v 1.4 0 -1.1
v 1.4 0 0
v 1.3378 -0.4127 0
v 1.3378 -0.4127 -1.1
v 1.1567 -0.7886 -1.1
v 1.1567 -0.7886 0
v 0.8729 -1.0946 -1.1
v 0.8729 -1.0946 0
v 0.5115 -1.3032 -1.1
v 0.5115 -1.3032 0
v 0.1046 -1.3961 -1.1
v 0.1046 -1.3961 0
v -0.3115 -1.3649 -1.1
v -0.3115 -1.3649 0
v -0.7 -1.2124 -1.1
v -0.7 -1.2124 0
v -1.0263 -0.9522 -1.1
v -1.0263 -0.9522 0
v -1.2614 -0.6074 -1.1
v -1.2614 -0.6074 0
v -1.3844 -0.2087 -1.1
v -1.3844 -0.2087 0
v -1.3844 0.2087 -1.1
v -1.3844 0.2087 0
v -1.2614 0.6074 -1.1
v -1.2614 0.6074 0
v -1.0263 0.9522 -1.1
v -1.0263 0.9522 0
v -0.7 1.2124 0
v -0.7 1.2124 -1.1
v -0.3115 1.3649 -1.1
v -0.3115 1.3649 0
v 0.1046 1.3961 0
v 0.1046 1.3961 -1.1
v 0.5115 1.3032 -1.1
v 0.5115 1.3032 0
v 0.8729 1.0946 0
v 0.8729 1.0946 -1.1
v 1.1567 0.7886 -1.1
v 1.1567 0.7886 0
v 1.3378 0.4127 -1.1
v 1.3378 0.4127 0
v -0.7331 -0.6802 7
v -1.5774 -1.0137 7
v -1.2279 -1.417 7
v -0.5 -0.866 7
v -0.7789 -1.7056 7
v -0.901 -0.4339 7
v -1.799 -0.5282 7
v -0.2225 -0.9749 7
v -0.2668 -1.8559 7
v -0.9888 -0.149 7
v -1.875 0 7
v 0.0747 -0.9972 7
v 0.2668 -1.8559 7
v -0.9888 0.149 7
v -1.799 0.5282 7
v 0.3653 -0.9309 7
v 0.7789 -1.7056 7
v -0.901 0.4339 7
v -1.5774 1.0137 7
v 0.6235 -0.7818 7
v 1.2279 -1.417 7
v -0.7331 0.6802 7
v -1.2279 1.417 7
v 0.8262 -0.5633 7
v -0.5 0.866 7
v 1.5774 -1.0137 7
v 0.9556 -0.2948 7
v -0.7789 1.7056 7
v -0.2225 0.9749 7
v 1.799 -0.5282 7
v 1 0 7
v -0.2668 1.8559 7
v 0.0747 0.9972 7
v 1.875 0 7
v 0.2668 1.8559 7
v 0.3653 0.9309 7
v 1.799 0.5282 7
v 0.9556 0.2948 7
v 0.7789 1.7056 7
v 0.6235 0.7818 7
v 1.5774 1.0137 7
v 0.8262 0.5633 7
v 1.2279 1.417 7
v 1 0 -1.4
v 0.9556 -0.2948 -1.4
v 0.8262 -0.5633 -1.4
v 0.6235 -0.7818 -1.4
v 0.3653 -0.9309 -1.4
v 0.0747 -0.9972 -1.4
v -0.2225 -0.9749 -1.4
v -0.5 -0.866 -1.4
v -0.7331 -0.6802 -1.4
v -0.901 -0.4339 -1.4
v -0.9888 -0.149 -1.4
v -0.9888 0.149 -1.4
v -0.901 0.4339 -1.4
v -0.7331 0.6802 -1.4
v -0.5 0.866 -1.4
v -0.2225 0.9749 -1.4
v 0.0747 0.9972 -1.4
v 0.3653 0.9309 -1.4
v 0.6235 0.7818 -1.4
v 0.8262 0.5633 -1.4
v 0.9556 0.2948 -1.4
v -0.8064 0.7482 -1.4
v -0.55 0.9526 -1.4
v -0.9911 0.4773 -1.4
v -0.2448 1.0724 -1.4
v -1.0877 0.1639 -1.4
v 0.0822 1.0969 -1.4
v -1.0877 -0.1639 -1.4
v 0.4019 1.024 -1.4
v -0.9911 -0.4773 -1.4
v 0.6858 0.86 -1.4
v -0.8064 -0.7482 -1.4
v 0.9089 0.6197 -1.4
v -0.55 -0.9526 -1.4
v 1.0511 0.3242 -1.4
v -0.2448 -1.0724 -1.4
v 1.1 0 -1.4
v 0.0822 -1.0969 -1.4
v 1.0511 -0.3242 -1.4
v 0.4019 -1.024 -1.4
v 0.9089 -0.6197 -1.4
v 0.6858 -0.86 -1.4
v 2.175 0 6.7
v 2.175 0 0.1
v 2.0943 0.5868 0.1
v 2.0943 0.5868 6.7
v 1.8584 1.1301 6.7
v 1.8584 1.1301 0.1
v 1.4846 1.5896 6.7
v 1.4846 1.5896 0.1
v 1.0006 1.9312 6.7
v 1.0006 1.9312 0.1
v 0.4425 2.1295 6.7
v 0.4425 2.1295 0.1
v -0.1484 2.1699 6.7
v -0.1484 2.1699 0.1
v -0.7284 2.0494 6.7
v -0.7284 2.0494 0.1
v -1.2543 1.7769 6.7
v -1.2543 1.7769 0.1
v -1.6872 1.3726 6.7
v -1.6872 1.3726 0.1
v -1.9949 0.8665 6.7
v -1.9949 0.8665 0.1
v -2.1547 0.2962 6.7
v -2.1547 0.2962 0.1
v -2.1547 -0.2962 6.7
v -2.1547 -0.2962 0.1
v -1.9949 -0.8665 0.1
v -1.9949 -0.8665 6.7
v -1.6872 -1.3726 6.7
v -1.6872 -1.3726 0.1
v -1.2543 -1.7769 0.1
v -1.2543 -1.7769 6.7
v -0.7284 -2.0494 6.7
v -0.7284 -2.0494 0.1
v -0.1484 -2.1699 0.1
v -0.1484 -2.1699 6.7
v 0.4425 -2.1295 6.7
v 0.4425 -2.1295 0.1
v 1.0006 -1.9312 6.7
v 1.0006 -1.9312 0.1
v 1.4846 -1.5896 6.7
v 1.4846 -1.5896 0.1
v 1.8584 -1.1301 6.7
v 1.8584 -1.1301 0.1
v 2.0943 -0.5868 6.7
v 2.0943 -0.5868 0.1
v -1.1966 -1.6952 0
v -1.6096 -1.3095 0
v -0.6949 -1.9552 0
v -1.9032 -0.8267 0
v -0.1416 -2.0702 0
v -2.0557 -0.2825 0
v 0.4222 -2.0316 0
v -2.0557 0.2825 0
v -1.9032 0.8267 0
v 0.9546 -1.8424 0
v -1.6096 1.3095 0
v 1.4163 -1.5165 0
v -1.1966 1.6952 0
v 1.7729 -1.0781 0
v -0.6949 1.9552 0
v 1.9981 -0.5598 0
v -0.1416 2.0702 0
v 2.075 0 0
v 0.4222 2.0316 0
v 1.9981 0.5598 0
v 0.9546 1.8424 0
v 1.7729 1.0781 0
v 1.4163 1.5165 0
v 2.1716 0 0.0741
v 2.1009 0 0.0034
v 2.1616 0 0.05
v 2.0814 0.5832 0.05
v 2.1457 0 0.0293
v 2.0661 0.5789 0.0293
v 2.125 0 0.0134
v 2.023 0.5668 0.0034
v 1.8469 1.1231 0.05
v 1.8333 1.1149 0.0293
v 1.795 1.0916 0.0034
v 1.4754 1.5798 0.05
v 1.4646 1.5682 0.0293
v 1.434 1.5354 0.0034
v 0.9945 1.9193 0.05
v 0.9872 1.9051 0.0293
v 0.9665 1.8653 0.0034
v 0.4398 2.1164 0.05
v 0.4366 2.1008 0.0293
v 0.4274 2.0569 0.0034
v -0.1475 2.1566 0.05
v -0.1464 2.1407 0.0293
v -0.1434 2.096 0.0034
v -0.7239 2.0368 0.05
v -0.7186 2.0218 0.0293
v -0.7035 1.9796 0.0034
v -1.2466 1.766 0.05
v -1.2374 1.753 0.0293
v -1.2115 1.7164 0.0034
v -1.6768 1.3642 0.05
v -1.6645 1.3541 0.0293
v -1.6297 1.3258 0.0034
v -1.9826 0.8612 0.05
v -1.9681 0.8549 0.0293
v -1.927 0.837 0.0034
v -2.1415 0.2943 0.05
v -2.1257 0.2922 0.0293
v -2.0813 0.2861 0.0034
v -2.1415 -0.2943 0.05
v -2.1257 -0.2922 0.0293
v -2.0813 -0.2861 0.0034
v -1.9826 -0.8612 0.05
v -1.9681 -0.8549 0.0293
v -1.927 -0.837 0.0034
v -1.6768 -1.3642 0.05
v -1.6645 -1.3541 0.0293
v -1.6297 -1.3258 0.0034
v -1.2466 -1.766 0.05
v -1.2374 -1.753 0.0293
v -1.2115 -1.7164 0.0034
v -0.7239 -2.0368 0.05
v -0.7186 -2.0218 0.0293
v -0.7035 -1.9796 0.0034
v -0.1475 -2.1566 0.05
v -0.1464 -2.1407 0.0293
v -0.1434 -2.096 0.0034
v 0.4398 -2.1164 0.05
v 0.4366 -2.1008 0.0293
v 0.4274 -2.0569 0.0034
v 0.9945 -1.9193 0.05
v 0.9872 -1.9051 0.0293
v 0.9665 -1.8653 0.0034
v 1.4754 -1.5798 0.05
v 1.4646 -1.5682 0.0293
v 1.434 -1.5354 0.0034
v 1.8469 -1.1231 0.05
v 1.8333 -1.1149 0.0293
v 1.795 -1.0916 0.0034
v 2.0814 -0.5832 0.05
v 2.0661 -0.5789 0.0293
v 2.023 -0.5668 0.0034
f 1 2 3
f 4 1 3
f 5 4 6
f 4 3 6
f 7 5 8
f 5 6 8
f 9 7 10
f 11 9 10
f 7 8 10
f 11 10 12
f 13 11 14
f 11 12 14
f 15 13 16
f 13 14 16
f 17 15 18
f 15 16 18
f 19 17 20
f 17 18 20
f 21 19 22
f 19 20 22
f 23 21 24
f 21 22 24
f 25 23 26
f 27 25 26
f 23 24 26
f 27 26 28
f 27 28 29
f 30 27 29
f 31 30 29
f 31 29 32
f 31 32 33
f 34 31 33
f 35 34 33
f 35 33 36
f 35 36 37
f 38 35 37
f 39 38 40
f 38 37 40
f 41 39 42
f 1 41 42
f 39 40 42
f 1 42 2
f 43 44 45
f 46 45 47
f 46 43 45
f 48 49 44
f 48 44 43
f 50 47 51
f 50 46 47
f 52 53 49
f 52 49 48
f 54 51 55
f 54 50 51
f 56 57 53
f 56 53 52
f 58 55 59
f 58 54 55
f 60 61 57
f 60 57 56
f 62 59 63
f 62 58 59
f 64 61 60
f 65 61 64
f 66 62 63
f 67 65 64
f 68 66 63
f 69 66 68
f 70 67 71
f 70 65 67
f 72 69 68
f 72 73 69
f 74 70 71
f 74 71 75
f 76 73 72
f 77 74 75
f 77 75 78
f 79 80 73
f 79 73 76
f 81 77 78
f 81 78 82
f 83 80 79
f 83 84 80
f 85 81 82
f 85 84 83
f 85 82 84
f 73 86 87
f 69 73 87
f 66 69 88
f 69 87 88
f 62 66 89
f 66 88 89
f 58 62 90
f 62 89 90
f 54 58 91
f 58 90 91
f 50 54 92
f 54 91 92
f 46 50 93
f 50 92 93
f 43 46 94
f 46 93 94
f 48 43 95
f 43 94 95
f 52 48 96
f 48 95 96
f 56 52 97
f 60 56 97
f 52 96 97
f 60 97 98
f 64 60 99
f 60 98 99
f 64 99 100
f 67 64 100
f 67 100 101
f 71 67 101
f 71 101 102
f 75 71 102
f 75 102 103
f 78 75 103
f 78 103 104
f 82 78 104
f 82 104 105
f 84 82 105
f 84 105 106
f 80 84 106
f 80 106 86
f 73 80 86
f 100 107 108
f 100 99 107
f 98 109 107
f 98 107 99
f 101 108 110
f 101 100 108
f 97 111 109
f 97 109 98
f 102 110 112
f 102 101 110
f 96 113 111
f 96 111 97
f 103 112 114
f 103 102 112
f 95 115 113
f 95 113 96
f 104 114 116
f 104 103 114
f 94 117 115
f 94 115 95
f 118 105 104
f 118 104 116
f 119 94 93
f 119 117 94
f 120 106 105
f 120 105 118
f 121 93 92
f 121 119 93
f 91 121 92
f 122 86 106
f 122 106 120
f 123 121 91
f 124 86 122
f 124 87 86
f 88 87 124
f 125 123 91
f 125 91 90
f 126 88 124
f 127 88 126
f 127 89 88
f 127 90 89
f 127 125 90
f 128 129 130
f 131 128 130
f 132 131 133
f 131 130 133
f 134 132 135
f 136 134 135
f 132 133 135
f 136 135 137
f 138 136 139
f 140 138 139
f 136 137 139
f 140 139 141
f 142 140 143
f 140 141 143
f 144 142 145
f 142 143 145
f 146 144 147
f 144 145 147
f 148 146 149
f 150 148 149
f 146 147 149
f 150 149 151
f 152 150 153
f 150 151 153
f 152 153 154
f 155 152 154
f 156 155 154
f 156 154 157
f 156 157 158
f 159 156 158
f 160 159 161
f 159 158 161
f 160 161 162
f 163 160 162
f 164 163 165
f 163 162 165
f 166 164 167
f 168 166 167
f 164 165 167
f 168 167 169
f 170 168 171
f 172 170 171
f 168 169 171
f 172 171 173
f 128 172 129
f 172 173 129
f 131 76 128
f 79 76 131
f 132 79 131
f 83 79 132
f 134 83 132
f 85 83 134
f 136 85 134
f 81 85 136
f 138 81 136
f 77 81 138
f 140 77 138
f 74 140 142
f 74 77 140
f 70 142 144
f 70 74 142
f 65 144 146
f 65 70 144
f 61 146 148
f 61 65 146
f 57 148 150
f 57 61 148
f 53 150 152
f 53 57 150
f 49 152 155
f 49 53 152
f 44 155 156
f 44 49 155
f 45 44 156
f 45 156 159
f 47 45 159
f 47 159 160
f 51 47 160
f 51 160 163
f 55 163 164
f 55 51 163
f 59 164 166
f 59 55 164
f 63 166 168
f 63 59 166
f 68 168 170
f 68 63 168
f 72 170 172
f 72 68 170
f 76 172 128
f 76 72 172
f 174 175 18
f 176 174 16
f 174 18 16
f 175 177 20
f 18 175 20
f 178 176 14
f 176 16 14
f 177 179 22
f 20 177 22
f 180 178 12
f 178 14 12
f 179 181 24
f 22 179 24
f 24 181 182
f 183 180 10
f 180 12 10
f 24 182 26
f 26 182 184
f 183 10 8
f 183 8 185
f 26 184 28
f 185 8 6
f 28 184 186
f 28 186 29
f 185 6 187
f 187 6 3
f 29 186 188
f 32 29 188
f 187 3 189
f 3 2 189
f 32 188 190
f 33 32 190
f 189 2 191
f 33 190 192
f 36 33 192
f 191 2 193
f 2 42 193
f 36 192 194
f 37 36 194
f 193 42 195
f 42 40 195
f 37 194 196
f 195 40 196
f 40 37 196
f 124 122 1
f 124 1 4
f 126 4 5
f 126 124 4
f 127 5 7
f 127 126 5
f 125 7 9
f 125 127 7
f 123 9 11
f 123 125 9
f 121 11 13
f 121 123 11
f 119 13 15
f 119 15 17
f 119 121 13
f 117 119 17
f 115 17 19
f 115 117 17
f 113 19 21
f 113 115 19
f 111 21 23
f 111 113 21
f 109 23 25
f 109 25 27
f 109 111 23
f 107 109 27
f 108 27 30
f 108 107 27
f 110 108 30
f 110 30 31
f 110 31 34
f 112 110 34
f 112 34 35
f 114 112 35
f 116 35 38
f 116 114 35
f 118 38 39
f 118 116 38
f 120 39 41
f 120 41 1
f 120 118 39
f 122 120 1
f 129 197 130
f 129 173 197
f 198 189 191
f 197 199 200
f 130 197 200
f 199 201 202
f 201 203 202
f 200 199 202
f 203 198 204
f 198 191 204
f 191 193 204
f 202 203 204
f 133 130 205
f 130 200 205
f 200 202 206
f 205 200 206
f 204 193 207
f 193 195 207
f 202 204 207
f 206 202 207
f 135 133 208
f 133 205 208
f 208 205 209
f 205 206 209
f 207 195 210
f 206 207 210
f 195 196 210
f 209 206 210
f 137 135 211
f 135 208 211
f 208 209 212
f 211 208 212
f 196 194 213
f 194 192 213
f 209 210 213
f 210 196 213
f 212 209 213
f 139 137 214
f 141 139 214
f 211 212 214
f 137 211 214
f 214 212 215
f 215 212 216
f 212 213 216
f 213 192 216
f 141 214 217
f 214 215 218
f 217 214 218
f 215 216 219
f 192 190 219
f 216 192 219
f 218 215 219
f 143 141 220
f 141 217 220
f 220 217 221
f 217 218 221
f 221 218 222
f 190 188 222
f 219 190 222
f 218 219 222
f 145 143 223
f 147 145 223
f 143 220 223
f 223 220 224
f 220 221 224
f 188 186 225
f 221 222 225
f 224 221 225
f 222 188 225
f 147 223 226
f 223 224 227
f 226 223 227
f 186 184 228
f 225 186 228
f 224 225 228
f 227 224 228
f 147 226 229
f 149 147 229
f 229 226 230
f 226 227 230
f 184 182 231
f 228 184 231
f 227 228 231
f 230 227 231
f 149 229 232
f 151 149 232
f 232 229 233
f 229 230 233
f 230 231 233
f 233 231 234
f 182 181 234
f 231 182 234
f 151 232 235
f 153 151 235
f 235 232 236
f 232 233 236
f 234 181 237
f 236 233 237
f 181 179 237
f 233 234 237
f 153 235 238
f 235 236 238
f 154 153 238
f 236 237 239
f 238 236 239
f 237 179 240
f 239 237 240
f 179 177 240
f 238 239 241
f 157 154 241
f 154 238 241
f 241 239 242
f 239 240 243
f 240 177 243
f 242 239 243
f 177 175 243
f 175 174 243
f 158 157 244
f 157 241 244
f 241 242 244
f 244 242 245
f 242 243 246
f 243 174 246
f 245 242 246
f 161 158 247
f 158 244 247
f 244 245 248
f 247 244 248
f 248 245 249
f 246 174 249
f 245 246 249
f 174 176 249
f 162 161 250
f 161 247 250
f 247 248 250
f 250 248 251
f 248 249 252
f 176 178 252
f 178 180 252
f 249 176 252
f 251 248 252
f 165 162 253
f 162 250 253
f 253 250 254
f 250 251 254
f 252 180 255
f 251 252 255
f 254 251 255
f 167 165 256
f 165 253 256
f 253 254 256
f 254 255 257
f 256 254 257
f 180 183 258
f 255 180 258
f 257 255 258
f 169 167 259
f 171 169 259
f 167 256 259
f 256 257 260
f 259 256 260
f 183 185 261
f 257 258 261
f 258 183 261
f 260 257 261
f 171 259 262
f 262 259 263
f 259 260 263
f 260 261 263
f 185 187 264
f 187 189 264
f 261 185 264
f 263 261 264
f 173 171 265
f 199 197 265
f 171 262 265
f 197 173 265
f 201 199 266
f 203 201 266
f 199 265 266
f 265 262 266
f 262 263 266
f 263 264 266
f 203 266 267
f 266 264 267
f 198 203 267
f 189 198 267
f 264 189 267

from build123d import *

# Parameters (mm, degrees)
SKETCH_R        = 2.175
PAD_DEPTH       = 7
SKETCH001_R     = 1.4
PAD001_DEPTH    = 1.4
SKETCH002_R     = 1
POCKET_DEPTH    = 8.401
CHAMFER_SIZE    = 0.3
CHAMFER001_SIZE = 0.3
FILLET_R        = 0.1


with BuildPart() as part:
    # Sketch → Pad (new body)
    with BuildSketch(Plane.XY):
        Circle(SKETCH_R)
    extrude(amount=PAD_DEPTH)

    # Sketch001 (on Face2 of Pad) → Pad001 (join)
    with BuildSketch(Plane(origin=(0, 0, 0), x_dir=(1, 0, 0), z_dir=(0, 0, -1))):
        Circle(SKETCH001_R)
    extrude(amount=PAD001_DEPTH)

    # Sketch002 (on Face5 of Pad001) → Pocket (cut, through all)
    with BuildSketch(Plane(origin=(0, 0, -1.4), x_dir=(1, 0, 0), z_dir=(0, 0, -1))):
        Circle(SKETCH002_R)
    extrude(amount=-POCKET_DEPTH, mode=Mode.SUBTRACT)

    # Chamfer
    chamfer_edges = [part.edges().sort_by_distance(p)[0] for p in [
        (-1.4, 0, -1.4),
    ]]
    chamfer(chamfer_edges, length=CHAMFER_SIZE)

    # Chamfer001
    chamfer001_edges = [part.edges().sort_by_distance(p)[0] for p in [
        (-2.175, 0, 7),
    ]]
    chamfer(chamfer001_edges, length=CHAMFER001_SIZE)

    # Fillet
    fillet_edges = [part.edges().sort_by_distance(p)[0] for p in [
        (-2.175, 0, 0),
    ]]
    fillet(fillet_edges, radius=FILLET_R)


solid = part.part
